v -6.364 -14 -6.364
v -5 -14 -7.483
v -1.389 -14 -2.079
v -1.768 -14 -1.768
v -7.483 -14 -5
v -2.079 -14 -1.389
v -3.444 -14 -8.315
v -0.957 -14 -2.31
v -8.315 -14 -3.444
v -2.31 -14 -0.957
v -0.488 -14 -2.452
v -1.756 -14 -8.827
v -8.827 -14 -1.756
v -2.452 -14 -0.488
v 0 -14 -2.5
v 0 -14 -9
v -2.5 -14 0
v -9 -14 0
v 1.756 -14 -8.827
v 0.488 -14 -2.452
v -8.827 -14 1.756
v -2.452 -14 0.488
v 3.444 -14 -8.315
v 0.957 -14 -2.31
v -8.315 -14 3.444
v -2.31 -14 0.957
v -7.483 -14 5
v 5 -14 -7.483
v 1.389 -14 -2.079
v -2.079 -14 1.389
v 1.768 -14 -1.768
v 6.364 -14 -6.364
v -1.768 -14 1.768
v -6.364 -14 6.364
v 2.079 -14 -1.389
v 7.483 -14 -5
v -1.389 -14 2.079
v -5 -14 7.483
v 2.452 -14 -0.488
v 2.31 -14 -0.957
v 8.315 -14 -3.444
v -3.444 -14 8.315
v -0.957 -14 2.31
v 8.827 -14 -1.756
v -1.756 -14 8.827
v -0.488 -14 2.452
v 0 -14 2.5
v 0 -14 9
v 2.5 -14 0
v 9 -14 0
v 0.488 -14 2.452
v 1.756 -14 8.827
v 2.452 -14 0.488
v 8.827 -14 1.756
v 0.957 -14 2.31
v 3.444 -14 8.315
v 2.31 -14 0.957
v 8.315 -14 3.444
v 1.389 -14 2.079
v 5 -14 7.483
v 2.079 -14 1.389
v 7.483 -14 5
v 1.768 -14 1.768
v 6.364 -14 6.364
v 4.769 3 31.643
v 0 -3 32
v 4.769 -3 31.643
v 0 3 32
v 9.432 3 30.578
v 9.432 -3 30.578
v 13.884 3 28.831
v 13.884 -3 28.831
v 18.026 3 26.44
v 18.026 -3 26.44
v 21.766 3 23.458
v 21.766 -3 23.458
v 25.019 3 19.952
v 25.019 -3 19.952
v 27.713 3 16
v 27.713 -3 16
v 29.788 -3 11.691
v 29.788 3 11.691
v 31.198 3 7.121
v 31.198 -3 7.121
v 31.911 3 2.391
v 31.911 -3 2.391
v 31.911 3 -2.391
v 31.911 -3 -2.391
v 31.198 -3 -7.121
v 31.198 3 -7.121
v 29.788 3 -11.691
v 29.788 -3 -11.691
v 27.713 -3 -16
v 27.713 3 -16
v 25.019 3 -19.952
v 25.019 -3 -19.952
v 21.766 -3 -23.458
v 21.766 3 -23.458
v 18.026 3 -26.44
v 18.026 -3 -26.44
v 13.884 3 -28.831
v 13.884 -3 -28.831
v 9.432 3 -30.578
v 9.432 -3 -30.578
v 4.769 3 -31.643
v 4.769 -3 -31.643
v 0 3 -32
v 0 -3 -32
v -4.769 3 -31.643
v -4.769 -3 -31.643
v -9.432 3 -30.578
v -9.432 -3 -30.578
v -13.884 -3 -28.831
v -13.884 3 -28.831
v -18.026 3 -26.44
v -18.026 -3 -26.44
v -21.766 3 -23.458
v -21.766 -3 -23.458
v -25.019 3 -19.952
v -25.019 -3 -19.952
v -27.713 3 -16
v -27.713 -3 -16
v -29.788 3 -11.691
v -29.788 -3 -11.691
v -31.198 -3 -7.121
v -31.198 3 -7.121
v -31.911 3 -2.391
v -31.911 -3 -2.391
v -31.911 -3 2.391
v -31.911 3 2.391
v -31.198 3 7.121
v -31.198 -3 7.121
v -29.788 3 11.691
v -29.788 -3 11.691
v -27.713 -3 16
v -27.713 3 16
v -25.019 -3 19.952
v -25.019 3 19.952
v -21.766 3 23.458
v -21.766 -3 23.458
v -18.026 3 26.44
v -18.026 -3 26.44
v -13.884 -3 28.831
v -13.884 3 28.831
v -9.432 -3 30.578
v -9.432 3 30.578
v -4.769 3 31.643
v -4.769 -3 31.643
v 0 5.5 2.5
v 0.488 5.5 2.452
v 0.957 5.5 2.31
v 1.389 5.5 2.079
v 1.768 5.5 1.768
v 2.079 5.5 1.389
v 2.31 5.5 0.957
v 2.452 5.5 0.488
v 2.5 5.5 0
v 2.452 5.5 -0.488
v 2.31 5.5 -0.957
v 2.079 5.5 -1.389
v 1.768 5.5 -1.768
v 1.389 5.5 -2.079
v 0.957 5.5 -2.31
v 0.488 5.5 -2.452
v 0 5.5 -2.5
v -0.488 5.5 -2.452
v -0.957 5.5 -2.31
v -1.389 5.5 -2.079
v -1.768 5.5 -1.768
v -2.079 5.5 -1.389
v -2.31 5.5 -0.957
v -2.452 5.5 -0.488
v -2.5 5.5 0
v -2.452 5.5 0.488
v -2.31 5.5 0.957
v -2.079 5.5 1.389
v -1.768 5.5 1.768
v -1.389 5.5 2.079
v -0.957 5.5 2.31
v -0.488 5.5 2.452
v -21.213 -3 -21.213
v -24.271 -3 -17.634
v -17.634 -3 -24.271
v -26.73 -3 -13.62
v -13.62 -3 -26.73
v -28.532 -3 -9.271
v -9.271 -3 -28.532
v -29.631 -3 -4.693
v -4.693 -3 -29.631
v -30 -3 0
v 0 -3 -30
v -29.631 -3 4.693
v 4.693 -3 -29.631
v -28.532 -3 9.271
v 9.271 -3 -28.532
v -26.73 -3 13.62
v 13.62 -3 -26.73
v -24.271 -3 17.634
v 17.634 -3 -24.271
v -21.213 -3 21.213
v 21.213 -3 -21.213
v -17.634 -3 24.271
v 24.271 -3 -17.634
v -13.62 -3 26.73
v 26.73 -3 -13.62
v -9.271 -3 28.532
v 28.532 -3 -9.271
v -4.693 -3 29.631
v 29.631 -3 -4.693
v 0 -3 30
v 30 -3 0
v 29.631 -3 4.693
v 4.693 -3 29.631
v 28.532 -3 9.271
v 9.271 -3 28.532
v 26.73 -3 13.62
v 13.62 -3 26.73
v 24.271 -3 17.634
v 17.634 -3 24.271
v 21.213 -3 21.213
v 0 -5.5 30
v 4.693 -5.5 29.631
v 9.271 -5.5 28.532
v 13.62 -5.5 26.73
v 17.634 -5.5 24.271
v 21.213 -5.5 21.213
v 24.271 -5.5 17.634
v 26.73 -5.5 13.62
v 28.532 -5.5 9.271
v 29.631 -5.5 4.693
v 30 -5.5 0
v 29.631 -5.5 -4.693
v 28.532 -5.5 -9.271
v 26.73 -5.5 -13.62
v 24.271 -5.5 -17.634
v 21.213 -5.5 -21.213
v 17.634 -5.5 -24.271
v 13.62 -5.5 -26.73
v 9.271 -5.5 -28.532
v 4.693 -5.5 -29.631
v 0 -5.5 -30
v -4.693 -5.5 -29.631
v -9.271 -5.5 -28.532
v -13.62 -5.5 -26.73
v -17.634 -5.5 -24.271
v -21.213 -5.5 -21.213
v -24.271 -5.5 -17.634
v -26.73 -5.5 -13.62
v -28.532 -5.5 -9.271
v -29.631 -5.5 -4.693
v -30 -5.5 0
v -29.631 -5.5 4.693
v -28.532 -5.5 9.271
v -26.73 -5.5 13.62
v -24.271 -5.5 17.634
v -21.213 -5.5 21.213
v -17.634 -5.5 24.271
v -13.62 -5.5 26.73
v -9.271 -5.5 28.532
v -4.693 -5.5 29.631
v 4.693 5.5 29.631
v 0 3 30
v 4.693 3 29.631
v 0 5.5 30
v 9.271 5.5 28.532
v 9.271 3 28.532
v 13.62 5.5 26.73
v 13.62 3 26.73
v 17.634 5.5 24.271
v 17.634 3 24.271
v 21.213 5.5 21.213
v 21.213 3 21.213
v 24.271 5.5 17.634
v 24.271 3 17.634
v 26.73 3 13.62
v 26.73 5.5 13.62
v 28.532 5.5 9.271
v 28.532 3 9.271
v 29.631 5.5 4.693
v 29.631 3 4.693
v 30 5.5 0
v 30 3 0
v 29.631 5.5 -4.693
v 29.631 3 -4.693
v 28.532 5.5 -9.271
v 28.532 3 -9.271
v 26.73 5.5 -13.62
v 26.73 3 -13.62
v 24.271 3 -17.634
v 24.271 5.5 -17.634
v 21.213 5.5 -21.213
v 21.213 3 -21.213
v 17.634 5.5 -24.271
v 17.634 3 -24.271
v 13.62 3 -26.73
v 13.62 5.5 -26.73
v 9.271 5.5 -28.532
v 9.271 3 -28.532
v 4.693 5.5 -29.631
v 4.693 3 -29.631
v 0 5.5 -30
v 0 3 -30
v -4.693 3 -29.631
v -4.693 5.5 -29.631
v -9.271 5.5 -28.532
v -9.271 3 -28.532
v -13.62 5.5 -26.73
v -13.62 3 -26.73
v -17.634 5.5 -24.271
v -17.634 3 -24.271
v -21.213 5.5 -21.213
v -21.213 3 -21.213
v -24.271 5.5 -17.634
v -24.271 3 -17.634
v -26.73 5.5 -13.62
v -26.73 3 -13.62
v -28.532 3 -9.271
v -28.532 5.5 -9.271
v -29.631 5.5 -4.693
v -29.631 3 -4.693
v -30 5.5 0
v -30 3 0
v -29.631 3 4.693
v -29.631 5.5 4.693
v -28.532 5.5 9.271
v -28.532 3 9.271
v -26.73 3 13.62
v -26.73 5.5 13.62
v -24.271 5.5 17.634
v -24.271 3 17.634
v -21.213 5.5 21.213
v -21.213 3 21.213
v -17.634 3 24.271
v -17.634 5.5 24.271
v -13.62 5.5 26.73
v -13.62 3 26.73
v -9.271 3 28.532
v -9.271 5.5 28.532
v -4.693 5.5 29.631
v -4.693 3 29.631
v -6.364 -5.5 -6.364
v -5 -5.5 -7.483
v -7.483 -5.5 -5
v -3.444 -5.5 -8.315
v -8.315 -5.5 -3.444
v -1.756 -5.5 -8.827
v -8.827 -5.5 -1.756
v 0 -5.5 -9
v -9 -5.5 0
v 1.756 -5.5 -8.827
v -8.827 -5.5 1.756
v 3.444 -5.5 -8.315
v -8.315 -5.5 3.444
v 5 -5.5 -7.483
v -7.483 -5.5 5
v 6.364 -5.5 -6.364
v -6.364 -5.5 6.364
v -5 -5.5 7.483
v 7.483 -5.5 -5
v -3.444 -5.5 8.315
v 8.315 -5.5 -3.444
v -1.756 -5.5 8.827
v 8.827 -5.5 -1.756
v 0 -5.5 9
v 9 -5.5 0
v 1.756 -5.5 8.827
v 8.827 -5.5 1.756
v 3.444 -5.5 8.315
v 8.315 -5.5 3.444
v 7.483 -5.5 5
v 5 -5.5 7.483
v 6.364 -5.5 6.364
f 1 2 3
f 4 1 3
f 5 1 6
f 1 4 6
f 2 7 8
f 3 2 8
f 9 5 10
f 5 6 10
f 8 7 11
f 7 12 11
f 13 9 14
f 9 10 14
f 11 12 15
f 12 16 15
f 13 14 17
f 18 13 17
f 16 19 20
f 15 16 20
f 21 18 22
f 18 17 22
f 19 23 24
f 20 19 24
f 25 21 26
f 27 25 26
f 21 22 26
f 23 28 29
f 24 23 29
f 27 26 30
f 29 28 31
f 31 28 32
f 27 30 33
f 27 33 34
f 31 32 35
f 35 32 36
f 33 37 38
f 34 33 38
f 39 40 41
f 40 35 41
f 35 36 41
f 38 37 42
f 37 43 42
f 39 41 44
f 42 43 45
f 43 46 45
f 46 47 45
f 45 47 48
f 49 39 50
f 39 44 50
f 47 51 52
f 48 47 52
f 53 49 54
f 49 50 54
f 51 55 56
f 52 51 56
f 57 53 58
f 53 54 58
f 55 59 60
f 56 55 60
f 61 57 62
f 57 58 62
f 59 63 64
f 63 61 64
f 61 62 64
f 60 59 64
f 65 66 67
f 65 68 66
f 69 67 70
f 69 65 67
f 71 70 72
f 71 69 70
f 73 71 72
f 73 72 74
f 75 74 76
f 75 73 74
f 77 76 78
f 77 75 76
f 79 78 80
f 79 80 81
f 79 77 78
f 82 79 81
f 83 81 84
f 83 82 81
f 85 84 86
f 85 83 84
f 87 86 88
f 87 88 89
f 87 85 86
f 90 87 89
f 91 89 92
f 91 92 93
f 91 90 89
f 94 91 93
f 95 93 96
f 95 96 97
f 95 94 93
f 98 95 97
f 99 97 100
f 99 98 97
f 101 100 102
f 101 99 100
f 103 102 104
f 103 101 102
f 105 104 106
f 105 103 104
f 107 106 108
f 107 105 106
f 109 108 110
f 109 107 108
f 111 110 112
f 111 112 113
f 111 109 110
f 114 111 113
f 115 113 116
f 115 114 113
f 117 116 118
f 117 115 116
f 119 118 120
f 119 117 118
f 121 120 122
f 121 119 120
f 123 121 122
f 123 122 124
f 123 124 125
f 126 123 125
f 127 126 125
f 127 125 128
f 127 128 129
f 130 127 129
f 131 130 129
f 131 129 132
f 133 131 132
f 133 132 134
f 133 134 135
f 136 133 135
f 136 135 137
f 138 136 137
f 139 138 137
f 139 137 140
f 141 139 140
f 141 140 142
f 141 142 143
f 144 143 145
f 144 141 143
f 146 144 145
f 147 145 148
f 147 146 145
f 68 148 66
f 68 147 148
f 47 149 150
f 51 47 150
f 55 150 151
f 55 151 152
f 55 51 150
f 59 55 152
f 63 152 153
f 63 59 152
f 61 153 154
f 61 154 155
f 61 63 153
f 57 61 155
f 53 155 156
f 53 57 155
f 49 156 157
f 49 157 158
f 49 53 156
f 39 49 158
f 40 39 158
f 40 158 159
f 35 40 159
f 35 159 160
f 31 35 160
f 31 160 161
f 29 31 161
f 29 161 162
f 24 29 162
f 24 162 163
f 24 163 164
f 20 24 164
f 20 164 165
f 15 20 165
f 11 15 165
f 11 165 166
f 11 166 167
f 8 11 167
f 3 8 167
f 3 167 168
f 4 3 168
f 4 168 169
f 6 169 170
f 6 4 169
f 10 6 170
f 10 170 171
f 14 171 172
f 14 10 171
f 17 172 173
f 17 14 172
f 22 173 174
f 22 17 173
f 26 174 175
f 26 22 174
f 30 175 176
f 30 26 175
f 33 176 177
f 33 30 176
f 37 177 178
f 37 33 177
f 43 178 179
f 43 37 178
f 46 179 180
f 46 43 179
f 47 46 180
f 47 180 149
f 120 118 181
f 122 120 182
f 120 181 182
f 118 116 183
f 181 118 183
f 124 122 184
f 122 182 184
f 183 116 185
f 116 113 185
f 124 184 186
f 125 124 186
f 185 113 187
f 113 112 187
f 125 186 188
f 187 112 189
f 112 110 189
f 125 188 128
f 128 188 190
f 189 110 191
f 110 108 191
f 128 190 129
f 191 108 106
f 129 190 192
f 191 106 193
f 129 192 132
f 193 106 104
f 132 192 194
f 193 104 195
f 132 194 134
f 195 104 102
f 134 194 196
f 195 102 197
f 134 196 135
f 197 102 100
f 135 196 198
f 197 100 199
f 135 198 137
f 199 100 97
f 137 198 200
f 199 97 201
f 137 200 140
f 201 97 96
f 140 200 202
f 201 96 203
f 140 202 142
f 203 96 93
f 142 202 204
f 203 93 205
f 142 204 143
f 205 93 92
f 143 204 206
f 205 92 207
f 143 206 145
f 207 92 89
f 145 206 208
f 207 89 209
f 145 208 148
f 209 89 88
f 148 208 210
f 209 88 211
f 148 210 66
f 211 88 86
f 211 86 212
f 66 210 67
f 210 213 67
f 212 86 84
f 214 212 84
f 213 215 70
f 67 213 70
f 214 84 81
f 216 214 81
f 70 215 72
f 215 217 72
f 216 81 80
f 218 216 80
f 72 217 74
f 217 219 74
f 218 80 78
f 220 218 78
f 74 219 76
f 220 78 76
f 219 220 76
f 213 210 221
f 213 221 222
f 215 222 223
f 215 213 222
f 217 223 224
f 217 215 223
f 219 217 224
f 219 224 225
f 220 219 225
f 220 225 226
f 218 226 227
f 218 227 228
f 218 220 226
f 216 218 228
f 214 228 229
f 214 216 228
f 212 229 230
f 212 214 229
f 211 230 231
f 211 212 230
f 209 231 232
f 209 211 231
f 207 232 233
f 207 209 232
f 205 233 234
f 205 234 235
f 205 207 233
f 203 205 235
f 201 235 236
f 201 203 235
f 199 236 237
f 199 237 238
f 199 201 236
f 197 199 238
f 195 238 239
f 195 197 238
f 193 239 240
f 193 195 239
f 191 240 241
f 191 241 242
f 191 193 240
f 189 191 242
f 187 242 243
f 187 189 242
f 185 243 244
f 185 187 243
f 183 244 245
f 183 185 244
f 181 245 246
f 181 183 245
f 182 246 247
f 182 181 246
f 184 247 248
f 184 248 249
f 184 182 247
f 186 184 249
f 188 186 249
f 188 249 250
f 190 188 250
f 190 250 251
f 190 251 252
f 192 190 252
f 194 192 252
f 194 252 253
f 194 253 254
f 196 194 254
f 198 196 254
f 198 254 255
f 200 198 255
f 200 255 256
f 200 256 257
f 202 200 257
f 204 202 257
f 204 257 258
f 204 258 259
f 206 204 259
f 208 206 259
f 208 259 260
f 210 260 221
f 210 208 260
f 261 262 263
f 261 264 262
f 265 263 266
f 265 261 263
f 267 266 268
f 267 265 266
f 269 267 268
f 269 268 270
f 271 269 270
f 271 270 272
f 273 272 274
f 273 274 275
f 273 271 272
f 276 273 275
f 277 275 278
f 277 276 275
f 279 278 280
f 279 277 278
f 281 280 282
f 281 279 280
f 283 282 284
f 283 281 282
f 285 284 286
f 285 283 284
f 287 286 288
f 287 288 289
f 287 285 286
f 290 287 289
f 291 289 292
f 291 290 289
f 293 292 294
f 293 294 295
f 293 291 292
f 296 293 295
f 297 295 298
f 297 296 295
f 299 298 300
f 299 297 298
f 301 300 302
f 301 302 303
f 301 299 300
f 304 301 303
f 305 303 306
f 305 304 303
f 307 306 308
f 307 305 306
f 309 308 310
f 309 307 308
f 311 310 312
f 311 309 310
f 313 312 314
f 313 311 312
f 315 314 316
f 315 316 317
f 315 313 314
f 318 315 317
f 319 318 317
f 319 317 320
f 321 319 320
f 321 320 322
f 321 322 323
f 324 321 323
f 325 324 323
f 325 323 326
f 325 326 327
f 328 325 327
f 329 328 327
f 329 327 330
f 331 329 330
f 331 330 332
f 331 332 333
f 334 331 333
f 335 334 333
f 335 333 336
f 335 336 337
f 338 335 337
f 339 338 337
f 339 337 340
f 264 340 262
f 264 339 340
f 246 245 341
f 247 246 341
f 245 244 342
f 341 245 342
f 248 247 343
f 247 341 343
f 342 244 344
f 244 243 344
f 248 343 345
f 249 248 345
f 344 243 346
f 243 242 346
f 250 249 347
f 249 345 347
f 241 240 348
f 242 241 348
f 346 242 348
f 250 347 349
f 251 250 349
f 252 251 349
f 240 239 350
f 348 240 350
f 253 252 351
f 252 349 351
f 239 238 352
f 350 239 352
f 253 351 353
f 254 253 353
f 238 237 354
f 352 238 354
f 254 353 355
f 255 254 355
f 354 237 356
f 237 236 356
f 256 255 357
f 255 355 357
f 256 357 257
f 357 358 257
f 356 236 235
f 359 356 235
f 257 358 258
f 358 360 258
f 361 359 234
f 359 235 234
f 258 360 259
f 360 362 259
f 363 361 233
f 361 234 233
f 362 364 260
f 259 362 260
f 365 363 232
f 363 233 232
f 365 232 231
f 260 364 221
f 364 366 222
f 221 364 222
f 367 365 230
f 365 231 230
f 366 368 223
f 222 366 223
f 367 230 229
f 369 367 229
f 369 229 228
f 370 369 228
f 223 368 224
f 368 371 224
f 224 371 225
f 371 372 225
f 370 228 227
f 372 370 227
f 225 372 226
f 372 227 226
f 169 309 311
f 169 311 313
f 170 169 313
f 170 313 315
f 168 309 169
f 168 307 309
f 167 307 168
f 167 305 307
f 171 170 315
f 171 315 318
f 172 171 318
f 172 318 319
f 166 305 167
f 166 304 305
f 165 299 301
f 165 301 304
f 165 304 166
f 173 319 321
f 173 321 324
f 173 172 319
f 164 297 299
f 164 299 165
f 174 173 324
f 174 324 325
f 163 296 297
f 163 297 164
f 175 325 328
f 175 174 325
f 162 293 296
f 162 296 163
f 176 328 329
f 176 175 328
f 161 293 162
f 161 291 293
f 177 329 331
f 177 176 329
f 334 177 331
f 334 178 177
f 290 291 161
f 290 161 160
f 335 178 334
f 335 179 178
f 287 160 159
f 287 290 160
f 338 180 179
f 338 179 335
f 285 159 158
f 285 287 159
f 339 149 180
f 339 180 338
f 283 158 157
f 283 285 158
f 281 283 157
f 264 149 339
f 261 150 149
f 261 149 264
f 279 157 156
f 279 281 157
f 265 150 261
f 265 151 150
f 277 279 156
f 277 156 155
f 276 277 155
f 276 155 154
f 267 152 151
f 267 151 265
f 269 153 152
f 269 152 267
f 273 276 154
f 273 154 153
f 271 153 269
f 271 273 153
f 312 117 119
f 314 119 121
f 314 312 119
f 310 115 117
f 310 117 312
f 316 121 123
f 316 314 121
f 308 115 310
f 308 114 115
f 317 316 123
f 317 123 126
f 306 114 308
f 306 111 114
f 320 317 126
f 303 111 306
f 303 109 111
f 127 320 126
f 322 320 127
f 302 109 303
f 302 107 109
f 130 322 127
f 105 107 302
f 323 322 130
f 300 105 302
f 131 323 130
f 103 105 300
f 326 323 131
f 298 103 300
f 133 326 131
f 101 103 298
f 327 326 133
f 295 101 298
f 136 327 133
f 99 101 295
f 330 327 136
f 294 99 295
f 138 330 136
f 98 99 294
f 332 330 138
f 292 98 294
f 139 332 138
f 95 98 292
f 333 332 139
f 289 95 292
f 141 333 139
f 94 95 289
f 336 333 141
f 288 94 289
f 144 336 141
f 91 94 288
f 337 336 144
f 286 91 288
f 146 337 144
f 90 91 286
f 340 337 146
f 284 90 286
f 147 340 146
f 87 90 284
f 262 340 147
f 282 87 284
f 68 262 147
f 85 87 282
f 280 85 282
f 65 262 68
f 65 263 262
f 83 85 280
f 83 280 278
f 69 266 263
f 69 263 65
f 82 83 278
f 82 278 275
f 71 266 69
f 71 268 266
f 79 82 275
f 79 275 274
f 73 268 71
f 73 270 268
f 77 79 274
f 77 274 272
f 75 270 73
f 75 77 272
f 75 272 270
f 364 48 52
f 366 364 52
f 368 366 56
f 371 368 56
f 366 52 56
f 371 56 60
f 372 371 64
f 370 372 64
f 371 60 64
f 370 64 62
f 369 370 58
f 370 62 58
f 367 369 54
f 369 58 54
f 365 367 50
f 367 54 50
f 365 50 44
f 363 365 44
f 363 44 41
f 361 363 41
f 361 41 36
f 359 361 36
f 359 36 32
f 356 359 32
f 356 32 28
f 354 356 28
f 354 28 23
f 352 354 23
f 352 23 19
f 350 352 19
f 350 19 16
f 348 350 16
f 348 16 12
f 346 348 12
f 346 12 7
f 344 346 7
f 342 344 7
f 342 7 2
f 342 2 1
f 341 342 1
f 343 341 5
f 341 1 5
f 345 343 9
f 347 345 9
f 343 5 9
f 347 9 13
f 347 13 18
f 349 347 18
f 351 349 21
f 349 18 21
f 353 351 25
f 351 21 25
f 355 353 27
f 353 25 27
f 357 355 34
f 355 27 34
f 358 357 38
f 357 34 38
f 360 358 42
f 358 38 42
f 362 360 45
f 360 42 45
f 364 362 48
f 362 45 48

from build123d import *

# Parameters (mm, degrees)
SKETCH_1_R      = 32
SKETCH_1_R_2    = 30
EXTRUDE_1_DEPTH = 3
SKETCH_1_3_R    = 30
SKETCH_1_3_R_2  = 9
EXTRUDE_2_DEPTH = 5.5
SKETCH_1_5_R    = 9
SKETCH_1_5_R_2  = 2.5
EXTRUDE_3_DEPTH = 5.5
EXTRUDE_START   = -14
SKETCH_1_6_R    = 9
SKETCH_1_6_R_2  = 2.5
EXTRUDE_4_DEPTH = 14


with BuildPart() as part:
    # 草图1 → 凸台-拉伸1 (new, symmetric)
    with BuildSketch(Plane(origin=(0, 0, 0), x_dir=(1, 0, 0), z_dir=(0, 1, 0))):
        Circle(SKETCH_1_R)
        Circle(SKETCH_1_R_2, mode=Mode.SUBTRACT)
    extrude(amount=EXTRUDE_1_DEPTH, both=True)

    # 草图1<3> → 凸台-拉伸2 (add, symmetric)
    with BuildSketch(Plane(origin=(0, 0, 0), x_dir=(1, 0, 0), z_dir=(0, 1, 0))):
        Circle(SKETCH_1_3_R)
        Circle(SKETCH_1_3_R_2, mode=Mode.SUBTRACT)
    extrude(amount=EXTRUDE_2_DEPTH, both=True)

    # 草图1<5> → 凸台-拉伸3 (add)
    with BuildSketch(Plane(origin=(0, 0, 0), x_dir=(1, 0, 0), z_dir=(0, 1, 0))):
        Circle(SKETCH_1_5_R)
        Circle(SKETCH_1_5_R_2, mode=Mode.SUBTRACT)
    extrude(amount=EXTRUDE_3_DEPTH)

    # 草图1<6> → 凸台-拉伸4 (add)
    with BuildSketch(Plane(origin=(0, 0, 0), x_dir=(1, 0, 0), z_dir=(0, 1, 0)).offset(EXTRUDE_START)):
        Circle(SKETCH_1_6_R)
        Circle(SKETCH_1_6_R_2, mode=Mode.SUBTRACT)
    extrude(amount=EXTRUDE_4_DEPTH)


solid = part.part
